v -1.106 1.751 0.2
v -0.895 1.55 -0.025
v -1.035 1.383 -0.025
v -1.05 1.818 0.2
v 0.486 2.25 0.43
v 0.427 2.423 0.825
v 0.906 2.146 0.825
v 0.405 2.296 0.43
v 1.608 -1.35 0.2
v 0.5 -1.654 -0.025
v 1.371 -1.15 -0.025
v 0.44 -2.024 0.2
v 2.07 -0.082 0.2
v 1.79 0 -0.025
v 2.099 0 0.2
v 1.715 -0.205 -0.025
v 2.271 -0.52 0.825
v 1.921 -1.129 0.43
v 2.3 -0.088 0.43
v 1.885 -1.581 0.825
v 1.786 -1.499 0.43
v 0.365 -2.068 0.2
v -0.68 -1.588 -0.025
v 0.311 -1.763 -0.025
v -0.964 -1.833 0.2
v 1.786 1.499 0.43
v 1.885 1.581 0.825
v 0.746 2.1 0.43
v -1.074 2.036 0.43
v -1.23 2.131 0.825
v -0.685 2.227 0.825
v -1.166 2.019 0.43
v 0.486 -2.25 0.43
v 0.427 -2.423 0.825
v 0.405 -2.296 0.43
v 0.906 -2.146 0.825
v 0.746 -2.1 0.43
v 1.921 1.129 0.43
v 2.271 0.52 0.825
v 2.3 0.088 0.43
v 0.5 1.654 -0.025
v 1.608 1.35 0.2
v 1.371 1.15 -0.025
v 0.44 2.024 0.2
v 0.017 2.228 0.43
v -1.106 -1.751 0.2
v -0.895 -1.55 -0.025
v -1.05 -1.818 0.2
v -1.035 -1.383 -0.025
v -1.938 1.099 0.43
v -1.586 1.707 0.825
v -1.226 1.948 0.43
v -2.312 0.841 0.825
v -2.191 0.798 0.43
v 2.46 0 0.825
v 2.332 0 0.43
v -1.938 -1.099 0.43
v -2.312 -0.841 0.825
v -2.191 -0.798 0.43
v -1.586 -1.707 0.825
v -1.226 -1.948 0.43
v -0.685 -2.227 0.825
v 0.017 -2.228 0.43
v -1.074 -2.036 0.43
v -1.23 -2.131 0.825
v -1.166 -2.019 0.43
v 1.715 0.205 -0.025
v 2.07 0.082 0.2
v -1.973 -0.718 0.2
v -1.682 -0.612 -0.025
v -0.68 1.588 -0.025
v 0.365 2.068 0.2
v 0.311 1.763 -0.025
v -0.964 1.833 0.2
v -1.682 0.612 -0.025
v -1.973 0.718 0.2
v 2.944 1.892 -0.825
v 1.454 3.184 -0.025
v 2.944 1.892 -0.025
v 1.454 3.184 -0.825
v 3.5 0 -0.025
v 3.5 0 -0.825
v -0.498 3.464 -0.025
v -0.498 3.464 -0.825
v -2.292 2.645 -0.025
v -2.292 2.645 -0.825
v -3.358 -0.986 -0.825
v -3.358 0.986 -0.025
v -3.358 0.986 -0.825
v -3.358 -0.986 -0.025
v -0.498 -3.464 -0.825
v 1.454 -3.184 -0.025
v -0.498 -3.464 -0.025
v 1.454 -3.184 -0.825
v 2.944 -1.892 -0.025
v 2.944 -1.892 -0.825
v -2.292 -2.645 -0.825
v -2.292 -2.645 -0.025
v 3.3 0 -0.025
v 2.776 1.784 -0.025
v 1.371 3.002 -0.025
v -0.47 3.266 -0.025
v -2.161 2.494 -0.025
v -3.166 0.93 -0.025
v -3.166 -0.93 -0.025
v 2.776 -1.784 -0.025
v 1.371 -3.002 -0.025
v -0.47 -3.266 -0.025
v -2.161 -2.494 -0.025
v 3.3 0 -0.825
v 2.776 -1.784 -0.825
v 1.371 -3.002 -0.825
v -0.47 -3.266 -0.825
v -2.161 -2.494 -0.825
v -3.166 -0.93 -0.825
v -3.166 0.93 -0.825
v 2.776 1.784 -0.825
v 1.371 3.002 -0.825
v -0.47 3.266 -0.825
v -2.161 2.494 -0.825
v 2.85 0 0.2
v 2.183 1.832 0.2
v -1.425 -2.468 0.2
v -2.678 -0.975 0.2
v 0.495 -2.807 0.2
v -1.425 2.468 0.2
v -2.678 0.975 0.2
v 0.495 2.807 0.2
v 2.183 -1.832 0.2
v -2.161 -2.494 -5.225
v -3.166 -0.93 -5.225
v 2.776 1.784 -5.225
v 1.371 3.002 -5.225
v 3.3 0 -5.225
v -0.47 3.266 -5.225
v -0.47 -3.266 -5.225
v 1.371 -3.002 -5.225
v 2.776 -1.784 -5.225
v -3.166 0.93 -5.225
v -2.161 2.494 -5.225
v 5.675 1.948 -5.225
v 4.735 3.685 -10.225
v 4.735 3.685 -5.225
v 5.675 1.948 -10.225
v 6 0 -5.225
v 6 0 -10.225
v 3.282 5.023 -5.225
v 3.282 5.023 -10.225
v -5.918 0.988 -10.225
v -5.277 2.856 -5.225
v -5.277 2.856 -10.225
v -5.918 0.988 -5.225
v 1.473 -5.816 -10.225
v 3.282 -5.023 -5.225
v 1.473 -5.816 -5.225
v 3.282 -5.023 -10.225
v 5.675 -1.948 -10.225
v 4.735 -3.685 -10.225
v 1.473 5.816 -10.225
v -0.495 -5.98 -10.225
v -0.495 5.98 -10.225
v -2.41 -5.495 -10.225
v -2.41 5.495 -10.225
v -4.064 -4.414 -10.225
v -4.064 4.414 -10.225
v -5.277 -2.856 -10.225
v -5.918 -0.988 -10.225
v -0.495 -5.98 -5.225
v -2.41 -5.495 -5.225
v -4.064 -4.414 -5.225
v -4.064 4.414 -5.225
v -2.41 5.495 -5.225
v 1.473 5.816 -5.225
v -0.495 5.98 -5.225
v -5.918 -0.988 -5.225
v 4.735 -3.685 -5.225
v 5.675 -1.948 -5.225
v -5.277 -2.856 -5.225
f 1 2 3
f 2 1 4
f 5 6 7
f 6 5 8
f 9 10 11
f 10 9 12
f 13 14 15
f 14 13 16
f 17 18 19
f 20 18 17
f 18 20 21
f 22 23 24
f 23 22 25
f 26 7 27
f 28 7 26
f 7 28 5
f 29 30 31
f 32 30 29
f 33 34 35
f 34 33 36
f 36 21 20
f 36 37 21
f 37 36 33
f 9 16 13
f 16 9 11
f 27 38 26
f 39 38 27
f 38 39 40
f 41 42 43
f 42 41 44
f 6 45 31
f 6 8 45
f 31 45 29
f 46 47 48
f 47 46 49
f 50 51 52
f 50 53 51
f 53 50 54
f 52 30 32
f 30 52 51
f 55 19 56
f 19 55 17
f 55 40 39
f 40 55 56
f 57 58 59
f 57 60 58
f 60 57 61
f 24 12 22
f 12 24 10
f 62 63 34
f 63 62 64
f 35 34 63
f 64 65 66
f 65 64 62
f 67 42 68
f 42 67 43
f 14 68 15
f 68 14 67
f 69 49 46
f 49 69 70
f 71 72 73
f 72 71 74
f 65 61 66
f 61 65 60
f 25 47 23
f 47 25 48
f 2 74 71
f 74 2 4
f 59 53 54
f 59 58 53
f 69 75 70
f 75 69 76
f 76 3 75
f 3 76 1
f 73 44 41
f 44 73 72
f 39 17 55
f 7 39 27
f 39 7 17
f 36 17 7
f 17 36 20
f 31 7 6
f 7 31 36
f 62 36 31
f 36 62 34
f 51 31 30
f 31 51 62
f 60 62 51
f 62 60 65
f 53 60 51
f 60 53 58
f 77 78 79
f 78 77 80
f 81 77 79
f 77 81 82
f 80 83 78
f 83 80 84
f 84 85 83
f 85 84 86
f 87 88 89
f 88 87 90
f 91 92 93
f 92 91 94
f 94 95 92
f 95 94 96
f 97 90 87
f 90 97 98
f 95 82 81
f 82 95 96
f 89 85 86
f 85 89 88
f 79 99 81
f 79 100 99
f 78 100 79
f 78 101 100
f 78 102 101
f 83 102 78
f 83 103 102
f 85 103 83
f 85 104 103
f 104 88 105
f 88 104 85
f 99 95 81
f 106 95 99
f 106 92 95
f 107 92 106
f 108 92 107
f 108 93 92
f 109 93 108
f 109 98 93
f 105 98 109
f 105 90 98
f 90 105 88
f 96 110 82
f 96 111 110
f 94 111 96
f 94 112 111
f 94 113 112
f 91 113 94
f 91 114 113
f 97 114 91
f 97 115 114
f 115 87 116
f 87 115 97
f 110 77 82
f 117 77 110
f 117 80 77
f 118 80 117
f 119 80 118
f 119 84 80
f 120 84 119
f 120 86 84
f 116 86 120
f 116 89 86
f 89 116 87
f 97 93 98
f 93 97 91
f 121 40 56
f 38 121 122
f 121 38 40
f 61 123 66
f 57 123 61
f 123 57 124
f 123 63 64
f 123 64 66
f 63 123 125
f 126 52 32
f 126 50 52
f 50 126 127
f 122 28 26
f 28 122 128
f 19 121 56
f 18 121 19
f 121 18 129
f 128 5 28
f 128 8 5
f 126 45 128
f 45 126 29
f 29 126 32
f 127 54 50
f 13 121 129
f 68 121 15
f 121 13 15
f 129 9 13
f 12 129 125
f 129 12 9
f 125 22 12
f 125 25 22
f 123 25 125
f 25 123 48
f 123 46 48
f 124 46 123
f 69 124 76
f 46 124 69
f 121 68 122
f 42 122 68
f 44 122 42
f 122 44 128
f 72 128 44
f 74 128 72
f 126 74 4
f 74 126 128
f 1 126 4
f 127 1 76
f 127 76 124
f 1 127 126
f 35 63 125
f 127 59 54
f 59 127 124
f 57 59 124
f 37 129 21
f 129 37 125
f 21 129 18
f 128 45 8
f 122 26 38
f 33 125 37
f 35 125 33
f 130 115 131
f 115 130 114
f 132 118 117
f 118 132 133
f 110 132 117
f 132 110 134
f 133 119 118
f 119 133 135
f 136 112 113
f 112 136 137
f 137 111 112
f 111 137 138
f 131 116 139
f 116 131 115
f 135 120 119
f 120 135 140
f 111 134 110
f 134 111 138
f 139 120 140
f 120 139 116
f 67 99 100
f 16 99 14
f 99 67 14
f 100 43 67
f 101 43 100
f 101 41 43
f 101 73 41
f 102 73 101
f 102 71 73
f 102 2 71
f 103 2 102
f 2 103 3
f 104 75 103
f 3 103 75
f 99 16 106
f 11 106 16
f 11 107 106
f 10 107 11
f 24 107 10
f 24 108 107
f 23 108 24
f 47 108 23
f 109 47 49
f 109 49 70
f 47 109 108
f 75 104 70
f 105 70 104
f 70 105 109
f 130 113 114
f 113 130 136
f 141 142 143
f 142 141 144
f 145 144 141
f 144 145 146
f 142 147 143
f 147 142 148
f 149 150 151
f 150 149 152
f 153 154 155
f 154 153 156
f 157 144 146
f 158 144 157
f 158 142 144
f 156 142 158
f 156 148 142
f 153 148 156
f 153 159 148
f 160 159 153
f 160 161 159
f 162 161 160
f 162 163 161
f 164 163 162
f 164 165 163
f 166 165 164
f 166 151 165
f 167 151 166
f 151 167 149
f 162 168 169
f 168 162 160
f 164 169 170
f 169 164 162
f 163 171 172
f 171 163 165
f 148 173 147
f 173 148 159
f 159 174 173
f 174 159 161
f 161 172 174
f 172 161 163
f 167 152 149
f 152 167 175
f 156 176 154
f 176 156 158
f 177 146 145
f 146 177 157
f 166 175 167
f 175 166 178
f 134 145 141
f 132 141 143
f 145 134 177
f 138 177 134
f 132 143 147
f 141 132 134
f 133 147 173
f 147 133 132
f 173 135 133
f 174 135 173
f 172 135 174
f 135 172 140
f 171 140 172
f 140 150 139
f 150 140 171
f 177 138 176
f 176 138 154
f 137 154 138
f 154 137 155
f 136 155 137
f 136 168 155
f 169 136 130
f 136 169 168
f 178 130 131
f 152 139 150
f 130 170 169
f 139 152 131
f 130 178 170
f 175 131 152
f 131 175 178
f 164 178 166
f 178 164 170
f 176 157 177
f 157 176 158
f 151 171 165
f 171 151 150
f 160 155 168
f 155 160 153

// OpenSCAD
// Parameters
thread_diameter = 3.0; //[1.5:6.0:0.1]
overall_length = 10.0; //[5.0:20.0:0.1]
head_diameter = 5.7; //[2.85:11.4:0.05]
head_height = 1.65; //[0.825:3.3:0.05]
shaft_radius = 1.5; //[0.75:3.0:0.05]
head_radius = 2.85; //[1.425:5.7:0.05]
tolerance_clearance = 0.0; //[0.0:0.5:0.01]
overlap = 0.8; //[0.5:2.0:0.1]
transition_height = 0.6; //[0.3:1.2:0.05]
washer_outer_diameter = 7.0; //[4.0:14.0:0.1]
washer_thickness = 0.8; //[0.4:2.0:0.05]
spacer_height = 6.0; //[3.0:12.0:0.1]
spacer_wall = 1.8; //[0.9:3.6:0.1]
buzzer_diameter = 12.0; //[6.0:24.0:0.1]
buzzer_height = 5.0; //[2.5:10.0:0.1]

// PCB Spacer - complete detailed geometry
module pcb_spacer() {
  color("Silver") {
    difference() {
      cylinder(r=shaft_radius + tolerance_clearance + spacer_wall, h=spacer_height, center=true);
      translate([0, 0, 0])
        cylinder(r=shaft_radius + tolerance_clearance, h=spacer_height + 2*overlap, center=true);
    }
  }
}

// Screw and Washer - complete detailed geometry
module screw_and_washer() {
  color("DimGray") {
    union() {
      // Screw Shaft
      translate([0, 0, -head_height/2 - overall_length/2 + overlap])
        cylinder(r=shaft_radius, h=overall_length, center=true);
      
      // Head to Shaft Transition
      translate([0, 0, -transition_height/2 + overlap])
        cylinder(r1=head_radius, r2=shaft_radius, h=transition_height, center=true);
      
      // Dome Head
      intersection() {
        translate([0, 0, head_radius - head_height/2])
          sphere(r=head_radius, center=true);
        translate([0, 0, 0])
          cube([2*head_radius + 2*overlap, 2*head_radius + 2*overlap, head_height], center=true);
      }
      
      // Washer
      translate([0, 0, -head_height/2 - washer_thickness/2 + overlap])
        difference() {
          cylinder(r=washer_outer_diameter/2, h=washer_thickness, center=true);
          cylinder(r=shaft_radius + tolerance_clearance, h=washer_thickness + 2*overlap, center=true);
        }
    }
  }
}

// Buzzer - complete detailed geometry
module buzzer() {
  color("Black") {
    translate([0, 0, -head_height/2 - washer_thickness - spacer_height - buzzer_height/2 + 3*overlap])
      cylinder(r=buzzer_diameter/2, h=buzzer_height, center=true);
  }
}

// Assembly
module assembly() {
  screw_and_washer();
  translate([0, 0, -head_height/2 - washer_thickness - spacer_height/2 + 2*overlap])
    pcb_spacer();
  buzzer();
}

assembly();
